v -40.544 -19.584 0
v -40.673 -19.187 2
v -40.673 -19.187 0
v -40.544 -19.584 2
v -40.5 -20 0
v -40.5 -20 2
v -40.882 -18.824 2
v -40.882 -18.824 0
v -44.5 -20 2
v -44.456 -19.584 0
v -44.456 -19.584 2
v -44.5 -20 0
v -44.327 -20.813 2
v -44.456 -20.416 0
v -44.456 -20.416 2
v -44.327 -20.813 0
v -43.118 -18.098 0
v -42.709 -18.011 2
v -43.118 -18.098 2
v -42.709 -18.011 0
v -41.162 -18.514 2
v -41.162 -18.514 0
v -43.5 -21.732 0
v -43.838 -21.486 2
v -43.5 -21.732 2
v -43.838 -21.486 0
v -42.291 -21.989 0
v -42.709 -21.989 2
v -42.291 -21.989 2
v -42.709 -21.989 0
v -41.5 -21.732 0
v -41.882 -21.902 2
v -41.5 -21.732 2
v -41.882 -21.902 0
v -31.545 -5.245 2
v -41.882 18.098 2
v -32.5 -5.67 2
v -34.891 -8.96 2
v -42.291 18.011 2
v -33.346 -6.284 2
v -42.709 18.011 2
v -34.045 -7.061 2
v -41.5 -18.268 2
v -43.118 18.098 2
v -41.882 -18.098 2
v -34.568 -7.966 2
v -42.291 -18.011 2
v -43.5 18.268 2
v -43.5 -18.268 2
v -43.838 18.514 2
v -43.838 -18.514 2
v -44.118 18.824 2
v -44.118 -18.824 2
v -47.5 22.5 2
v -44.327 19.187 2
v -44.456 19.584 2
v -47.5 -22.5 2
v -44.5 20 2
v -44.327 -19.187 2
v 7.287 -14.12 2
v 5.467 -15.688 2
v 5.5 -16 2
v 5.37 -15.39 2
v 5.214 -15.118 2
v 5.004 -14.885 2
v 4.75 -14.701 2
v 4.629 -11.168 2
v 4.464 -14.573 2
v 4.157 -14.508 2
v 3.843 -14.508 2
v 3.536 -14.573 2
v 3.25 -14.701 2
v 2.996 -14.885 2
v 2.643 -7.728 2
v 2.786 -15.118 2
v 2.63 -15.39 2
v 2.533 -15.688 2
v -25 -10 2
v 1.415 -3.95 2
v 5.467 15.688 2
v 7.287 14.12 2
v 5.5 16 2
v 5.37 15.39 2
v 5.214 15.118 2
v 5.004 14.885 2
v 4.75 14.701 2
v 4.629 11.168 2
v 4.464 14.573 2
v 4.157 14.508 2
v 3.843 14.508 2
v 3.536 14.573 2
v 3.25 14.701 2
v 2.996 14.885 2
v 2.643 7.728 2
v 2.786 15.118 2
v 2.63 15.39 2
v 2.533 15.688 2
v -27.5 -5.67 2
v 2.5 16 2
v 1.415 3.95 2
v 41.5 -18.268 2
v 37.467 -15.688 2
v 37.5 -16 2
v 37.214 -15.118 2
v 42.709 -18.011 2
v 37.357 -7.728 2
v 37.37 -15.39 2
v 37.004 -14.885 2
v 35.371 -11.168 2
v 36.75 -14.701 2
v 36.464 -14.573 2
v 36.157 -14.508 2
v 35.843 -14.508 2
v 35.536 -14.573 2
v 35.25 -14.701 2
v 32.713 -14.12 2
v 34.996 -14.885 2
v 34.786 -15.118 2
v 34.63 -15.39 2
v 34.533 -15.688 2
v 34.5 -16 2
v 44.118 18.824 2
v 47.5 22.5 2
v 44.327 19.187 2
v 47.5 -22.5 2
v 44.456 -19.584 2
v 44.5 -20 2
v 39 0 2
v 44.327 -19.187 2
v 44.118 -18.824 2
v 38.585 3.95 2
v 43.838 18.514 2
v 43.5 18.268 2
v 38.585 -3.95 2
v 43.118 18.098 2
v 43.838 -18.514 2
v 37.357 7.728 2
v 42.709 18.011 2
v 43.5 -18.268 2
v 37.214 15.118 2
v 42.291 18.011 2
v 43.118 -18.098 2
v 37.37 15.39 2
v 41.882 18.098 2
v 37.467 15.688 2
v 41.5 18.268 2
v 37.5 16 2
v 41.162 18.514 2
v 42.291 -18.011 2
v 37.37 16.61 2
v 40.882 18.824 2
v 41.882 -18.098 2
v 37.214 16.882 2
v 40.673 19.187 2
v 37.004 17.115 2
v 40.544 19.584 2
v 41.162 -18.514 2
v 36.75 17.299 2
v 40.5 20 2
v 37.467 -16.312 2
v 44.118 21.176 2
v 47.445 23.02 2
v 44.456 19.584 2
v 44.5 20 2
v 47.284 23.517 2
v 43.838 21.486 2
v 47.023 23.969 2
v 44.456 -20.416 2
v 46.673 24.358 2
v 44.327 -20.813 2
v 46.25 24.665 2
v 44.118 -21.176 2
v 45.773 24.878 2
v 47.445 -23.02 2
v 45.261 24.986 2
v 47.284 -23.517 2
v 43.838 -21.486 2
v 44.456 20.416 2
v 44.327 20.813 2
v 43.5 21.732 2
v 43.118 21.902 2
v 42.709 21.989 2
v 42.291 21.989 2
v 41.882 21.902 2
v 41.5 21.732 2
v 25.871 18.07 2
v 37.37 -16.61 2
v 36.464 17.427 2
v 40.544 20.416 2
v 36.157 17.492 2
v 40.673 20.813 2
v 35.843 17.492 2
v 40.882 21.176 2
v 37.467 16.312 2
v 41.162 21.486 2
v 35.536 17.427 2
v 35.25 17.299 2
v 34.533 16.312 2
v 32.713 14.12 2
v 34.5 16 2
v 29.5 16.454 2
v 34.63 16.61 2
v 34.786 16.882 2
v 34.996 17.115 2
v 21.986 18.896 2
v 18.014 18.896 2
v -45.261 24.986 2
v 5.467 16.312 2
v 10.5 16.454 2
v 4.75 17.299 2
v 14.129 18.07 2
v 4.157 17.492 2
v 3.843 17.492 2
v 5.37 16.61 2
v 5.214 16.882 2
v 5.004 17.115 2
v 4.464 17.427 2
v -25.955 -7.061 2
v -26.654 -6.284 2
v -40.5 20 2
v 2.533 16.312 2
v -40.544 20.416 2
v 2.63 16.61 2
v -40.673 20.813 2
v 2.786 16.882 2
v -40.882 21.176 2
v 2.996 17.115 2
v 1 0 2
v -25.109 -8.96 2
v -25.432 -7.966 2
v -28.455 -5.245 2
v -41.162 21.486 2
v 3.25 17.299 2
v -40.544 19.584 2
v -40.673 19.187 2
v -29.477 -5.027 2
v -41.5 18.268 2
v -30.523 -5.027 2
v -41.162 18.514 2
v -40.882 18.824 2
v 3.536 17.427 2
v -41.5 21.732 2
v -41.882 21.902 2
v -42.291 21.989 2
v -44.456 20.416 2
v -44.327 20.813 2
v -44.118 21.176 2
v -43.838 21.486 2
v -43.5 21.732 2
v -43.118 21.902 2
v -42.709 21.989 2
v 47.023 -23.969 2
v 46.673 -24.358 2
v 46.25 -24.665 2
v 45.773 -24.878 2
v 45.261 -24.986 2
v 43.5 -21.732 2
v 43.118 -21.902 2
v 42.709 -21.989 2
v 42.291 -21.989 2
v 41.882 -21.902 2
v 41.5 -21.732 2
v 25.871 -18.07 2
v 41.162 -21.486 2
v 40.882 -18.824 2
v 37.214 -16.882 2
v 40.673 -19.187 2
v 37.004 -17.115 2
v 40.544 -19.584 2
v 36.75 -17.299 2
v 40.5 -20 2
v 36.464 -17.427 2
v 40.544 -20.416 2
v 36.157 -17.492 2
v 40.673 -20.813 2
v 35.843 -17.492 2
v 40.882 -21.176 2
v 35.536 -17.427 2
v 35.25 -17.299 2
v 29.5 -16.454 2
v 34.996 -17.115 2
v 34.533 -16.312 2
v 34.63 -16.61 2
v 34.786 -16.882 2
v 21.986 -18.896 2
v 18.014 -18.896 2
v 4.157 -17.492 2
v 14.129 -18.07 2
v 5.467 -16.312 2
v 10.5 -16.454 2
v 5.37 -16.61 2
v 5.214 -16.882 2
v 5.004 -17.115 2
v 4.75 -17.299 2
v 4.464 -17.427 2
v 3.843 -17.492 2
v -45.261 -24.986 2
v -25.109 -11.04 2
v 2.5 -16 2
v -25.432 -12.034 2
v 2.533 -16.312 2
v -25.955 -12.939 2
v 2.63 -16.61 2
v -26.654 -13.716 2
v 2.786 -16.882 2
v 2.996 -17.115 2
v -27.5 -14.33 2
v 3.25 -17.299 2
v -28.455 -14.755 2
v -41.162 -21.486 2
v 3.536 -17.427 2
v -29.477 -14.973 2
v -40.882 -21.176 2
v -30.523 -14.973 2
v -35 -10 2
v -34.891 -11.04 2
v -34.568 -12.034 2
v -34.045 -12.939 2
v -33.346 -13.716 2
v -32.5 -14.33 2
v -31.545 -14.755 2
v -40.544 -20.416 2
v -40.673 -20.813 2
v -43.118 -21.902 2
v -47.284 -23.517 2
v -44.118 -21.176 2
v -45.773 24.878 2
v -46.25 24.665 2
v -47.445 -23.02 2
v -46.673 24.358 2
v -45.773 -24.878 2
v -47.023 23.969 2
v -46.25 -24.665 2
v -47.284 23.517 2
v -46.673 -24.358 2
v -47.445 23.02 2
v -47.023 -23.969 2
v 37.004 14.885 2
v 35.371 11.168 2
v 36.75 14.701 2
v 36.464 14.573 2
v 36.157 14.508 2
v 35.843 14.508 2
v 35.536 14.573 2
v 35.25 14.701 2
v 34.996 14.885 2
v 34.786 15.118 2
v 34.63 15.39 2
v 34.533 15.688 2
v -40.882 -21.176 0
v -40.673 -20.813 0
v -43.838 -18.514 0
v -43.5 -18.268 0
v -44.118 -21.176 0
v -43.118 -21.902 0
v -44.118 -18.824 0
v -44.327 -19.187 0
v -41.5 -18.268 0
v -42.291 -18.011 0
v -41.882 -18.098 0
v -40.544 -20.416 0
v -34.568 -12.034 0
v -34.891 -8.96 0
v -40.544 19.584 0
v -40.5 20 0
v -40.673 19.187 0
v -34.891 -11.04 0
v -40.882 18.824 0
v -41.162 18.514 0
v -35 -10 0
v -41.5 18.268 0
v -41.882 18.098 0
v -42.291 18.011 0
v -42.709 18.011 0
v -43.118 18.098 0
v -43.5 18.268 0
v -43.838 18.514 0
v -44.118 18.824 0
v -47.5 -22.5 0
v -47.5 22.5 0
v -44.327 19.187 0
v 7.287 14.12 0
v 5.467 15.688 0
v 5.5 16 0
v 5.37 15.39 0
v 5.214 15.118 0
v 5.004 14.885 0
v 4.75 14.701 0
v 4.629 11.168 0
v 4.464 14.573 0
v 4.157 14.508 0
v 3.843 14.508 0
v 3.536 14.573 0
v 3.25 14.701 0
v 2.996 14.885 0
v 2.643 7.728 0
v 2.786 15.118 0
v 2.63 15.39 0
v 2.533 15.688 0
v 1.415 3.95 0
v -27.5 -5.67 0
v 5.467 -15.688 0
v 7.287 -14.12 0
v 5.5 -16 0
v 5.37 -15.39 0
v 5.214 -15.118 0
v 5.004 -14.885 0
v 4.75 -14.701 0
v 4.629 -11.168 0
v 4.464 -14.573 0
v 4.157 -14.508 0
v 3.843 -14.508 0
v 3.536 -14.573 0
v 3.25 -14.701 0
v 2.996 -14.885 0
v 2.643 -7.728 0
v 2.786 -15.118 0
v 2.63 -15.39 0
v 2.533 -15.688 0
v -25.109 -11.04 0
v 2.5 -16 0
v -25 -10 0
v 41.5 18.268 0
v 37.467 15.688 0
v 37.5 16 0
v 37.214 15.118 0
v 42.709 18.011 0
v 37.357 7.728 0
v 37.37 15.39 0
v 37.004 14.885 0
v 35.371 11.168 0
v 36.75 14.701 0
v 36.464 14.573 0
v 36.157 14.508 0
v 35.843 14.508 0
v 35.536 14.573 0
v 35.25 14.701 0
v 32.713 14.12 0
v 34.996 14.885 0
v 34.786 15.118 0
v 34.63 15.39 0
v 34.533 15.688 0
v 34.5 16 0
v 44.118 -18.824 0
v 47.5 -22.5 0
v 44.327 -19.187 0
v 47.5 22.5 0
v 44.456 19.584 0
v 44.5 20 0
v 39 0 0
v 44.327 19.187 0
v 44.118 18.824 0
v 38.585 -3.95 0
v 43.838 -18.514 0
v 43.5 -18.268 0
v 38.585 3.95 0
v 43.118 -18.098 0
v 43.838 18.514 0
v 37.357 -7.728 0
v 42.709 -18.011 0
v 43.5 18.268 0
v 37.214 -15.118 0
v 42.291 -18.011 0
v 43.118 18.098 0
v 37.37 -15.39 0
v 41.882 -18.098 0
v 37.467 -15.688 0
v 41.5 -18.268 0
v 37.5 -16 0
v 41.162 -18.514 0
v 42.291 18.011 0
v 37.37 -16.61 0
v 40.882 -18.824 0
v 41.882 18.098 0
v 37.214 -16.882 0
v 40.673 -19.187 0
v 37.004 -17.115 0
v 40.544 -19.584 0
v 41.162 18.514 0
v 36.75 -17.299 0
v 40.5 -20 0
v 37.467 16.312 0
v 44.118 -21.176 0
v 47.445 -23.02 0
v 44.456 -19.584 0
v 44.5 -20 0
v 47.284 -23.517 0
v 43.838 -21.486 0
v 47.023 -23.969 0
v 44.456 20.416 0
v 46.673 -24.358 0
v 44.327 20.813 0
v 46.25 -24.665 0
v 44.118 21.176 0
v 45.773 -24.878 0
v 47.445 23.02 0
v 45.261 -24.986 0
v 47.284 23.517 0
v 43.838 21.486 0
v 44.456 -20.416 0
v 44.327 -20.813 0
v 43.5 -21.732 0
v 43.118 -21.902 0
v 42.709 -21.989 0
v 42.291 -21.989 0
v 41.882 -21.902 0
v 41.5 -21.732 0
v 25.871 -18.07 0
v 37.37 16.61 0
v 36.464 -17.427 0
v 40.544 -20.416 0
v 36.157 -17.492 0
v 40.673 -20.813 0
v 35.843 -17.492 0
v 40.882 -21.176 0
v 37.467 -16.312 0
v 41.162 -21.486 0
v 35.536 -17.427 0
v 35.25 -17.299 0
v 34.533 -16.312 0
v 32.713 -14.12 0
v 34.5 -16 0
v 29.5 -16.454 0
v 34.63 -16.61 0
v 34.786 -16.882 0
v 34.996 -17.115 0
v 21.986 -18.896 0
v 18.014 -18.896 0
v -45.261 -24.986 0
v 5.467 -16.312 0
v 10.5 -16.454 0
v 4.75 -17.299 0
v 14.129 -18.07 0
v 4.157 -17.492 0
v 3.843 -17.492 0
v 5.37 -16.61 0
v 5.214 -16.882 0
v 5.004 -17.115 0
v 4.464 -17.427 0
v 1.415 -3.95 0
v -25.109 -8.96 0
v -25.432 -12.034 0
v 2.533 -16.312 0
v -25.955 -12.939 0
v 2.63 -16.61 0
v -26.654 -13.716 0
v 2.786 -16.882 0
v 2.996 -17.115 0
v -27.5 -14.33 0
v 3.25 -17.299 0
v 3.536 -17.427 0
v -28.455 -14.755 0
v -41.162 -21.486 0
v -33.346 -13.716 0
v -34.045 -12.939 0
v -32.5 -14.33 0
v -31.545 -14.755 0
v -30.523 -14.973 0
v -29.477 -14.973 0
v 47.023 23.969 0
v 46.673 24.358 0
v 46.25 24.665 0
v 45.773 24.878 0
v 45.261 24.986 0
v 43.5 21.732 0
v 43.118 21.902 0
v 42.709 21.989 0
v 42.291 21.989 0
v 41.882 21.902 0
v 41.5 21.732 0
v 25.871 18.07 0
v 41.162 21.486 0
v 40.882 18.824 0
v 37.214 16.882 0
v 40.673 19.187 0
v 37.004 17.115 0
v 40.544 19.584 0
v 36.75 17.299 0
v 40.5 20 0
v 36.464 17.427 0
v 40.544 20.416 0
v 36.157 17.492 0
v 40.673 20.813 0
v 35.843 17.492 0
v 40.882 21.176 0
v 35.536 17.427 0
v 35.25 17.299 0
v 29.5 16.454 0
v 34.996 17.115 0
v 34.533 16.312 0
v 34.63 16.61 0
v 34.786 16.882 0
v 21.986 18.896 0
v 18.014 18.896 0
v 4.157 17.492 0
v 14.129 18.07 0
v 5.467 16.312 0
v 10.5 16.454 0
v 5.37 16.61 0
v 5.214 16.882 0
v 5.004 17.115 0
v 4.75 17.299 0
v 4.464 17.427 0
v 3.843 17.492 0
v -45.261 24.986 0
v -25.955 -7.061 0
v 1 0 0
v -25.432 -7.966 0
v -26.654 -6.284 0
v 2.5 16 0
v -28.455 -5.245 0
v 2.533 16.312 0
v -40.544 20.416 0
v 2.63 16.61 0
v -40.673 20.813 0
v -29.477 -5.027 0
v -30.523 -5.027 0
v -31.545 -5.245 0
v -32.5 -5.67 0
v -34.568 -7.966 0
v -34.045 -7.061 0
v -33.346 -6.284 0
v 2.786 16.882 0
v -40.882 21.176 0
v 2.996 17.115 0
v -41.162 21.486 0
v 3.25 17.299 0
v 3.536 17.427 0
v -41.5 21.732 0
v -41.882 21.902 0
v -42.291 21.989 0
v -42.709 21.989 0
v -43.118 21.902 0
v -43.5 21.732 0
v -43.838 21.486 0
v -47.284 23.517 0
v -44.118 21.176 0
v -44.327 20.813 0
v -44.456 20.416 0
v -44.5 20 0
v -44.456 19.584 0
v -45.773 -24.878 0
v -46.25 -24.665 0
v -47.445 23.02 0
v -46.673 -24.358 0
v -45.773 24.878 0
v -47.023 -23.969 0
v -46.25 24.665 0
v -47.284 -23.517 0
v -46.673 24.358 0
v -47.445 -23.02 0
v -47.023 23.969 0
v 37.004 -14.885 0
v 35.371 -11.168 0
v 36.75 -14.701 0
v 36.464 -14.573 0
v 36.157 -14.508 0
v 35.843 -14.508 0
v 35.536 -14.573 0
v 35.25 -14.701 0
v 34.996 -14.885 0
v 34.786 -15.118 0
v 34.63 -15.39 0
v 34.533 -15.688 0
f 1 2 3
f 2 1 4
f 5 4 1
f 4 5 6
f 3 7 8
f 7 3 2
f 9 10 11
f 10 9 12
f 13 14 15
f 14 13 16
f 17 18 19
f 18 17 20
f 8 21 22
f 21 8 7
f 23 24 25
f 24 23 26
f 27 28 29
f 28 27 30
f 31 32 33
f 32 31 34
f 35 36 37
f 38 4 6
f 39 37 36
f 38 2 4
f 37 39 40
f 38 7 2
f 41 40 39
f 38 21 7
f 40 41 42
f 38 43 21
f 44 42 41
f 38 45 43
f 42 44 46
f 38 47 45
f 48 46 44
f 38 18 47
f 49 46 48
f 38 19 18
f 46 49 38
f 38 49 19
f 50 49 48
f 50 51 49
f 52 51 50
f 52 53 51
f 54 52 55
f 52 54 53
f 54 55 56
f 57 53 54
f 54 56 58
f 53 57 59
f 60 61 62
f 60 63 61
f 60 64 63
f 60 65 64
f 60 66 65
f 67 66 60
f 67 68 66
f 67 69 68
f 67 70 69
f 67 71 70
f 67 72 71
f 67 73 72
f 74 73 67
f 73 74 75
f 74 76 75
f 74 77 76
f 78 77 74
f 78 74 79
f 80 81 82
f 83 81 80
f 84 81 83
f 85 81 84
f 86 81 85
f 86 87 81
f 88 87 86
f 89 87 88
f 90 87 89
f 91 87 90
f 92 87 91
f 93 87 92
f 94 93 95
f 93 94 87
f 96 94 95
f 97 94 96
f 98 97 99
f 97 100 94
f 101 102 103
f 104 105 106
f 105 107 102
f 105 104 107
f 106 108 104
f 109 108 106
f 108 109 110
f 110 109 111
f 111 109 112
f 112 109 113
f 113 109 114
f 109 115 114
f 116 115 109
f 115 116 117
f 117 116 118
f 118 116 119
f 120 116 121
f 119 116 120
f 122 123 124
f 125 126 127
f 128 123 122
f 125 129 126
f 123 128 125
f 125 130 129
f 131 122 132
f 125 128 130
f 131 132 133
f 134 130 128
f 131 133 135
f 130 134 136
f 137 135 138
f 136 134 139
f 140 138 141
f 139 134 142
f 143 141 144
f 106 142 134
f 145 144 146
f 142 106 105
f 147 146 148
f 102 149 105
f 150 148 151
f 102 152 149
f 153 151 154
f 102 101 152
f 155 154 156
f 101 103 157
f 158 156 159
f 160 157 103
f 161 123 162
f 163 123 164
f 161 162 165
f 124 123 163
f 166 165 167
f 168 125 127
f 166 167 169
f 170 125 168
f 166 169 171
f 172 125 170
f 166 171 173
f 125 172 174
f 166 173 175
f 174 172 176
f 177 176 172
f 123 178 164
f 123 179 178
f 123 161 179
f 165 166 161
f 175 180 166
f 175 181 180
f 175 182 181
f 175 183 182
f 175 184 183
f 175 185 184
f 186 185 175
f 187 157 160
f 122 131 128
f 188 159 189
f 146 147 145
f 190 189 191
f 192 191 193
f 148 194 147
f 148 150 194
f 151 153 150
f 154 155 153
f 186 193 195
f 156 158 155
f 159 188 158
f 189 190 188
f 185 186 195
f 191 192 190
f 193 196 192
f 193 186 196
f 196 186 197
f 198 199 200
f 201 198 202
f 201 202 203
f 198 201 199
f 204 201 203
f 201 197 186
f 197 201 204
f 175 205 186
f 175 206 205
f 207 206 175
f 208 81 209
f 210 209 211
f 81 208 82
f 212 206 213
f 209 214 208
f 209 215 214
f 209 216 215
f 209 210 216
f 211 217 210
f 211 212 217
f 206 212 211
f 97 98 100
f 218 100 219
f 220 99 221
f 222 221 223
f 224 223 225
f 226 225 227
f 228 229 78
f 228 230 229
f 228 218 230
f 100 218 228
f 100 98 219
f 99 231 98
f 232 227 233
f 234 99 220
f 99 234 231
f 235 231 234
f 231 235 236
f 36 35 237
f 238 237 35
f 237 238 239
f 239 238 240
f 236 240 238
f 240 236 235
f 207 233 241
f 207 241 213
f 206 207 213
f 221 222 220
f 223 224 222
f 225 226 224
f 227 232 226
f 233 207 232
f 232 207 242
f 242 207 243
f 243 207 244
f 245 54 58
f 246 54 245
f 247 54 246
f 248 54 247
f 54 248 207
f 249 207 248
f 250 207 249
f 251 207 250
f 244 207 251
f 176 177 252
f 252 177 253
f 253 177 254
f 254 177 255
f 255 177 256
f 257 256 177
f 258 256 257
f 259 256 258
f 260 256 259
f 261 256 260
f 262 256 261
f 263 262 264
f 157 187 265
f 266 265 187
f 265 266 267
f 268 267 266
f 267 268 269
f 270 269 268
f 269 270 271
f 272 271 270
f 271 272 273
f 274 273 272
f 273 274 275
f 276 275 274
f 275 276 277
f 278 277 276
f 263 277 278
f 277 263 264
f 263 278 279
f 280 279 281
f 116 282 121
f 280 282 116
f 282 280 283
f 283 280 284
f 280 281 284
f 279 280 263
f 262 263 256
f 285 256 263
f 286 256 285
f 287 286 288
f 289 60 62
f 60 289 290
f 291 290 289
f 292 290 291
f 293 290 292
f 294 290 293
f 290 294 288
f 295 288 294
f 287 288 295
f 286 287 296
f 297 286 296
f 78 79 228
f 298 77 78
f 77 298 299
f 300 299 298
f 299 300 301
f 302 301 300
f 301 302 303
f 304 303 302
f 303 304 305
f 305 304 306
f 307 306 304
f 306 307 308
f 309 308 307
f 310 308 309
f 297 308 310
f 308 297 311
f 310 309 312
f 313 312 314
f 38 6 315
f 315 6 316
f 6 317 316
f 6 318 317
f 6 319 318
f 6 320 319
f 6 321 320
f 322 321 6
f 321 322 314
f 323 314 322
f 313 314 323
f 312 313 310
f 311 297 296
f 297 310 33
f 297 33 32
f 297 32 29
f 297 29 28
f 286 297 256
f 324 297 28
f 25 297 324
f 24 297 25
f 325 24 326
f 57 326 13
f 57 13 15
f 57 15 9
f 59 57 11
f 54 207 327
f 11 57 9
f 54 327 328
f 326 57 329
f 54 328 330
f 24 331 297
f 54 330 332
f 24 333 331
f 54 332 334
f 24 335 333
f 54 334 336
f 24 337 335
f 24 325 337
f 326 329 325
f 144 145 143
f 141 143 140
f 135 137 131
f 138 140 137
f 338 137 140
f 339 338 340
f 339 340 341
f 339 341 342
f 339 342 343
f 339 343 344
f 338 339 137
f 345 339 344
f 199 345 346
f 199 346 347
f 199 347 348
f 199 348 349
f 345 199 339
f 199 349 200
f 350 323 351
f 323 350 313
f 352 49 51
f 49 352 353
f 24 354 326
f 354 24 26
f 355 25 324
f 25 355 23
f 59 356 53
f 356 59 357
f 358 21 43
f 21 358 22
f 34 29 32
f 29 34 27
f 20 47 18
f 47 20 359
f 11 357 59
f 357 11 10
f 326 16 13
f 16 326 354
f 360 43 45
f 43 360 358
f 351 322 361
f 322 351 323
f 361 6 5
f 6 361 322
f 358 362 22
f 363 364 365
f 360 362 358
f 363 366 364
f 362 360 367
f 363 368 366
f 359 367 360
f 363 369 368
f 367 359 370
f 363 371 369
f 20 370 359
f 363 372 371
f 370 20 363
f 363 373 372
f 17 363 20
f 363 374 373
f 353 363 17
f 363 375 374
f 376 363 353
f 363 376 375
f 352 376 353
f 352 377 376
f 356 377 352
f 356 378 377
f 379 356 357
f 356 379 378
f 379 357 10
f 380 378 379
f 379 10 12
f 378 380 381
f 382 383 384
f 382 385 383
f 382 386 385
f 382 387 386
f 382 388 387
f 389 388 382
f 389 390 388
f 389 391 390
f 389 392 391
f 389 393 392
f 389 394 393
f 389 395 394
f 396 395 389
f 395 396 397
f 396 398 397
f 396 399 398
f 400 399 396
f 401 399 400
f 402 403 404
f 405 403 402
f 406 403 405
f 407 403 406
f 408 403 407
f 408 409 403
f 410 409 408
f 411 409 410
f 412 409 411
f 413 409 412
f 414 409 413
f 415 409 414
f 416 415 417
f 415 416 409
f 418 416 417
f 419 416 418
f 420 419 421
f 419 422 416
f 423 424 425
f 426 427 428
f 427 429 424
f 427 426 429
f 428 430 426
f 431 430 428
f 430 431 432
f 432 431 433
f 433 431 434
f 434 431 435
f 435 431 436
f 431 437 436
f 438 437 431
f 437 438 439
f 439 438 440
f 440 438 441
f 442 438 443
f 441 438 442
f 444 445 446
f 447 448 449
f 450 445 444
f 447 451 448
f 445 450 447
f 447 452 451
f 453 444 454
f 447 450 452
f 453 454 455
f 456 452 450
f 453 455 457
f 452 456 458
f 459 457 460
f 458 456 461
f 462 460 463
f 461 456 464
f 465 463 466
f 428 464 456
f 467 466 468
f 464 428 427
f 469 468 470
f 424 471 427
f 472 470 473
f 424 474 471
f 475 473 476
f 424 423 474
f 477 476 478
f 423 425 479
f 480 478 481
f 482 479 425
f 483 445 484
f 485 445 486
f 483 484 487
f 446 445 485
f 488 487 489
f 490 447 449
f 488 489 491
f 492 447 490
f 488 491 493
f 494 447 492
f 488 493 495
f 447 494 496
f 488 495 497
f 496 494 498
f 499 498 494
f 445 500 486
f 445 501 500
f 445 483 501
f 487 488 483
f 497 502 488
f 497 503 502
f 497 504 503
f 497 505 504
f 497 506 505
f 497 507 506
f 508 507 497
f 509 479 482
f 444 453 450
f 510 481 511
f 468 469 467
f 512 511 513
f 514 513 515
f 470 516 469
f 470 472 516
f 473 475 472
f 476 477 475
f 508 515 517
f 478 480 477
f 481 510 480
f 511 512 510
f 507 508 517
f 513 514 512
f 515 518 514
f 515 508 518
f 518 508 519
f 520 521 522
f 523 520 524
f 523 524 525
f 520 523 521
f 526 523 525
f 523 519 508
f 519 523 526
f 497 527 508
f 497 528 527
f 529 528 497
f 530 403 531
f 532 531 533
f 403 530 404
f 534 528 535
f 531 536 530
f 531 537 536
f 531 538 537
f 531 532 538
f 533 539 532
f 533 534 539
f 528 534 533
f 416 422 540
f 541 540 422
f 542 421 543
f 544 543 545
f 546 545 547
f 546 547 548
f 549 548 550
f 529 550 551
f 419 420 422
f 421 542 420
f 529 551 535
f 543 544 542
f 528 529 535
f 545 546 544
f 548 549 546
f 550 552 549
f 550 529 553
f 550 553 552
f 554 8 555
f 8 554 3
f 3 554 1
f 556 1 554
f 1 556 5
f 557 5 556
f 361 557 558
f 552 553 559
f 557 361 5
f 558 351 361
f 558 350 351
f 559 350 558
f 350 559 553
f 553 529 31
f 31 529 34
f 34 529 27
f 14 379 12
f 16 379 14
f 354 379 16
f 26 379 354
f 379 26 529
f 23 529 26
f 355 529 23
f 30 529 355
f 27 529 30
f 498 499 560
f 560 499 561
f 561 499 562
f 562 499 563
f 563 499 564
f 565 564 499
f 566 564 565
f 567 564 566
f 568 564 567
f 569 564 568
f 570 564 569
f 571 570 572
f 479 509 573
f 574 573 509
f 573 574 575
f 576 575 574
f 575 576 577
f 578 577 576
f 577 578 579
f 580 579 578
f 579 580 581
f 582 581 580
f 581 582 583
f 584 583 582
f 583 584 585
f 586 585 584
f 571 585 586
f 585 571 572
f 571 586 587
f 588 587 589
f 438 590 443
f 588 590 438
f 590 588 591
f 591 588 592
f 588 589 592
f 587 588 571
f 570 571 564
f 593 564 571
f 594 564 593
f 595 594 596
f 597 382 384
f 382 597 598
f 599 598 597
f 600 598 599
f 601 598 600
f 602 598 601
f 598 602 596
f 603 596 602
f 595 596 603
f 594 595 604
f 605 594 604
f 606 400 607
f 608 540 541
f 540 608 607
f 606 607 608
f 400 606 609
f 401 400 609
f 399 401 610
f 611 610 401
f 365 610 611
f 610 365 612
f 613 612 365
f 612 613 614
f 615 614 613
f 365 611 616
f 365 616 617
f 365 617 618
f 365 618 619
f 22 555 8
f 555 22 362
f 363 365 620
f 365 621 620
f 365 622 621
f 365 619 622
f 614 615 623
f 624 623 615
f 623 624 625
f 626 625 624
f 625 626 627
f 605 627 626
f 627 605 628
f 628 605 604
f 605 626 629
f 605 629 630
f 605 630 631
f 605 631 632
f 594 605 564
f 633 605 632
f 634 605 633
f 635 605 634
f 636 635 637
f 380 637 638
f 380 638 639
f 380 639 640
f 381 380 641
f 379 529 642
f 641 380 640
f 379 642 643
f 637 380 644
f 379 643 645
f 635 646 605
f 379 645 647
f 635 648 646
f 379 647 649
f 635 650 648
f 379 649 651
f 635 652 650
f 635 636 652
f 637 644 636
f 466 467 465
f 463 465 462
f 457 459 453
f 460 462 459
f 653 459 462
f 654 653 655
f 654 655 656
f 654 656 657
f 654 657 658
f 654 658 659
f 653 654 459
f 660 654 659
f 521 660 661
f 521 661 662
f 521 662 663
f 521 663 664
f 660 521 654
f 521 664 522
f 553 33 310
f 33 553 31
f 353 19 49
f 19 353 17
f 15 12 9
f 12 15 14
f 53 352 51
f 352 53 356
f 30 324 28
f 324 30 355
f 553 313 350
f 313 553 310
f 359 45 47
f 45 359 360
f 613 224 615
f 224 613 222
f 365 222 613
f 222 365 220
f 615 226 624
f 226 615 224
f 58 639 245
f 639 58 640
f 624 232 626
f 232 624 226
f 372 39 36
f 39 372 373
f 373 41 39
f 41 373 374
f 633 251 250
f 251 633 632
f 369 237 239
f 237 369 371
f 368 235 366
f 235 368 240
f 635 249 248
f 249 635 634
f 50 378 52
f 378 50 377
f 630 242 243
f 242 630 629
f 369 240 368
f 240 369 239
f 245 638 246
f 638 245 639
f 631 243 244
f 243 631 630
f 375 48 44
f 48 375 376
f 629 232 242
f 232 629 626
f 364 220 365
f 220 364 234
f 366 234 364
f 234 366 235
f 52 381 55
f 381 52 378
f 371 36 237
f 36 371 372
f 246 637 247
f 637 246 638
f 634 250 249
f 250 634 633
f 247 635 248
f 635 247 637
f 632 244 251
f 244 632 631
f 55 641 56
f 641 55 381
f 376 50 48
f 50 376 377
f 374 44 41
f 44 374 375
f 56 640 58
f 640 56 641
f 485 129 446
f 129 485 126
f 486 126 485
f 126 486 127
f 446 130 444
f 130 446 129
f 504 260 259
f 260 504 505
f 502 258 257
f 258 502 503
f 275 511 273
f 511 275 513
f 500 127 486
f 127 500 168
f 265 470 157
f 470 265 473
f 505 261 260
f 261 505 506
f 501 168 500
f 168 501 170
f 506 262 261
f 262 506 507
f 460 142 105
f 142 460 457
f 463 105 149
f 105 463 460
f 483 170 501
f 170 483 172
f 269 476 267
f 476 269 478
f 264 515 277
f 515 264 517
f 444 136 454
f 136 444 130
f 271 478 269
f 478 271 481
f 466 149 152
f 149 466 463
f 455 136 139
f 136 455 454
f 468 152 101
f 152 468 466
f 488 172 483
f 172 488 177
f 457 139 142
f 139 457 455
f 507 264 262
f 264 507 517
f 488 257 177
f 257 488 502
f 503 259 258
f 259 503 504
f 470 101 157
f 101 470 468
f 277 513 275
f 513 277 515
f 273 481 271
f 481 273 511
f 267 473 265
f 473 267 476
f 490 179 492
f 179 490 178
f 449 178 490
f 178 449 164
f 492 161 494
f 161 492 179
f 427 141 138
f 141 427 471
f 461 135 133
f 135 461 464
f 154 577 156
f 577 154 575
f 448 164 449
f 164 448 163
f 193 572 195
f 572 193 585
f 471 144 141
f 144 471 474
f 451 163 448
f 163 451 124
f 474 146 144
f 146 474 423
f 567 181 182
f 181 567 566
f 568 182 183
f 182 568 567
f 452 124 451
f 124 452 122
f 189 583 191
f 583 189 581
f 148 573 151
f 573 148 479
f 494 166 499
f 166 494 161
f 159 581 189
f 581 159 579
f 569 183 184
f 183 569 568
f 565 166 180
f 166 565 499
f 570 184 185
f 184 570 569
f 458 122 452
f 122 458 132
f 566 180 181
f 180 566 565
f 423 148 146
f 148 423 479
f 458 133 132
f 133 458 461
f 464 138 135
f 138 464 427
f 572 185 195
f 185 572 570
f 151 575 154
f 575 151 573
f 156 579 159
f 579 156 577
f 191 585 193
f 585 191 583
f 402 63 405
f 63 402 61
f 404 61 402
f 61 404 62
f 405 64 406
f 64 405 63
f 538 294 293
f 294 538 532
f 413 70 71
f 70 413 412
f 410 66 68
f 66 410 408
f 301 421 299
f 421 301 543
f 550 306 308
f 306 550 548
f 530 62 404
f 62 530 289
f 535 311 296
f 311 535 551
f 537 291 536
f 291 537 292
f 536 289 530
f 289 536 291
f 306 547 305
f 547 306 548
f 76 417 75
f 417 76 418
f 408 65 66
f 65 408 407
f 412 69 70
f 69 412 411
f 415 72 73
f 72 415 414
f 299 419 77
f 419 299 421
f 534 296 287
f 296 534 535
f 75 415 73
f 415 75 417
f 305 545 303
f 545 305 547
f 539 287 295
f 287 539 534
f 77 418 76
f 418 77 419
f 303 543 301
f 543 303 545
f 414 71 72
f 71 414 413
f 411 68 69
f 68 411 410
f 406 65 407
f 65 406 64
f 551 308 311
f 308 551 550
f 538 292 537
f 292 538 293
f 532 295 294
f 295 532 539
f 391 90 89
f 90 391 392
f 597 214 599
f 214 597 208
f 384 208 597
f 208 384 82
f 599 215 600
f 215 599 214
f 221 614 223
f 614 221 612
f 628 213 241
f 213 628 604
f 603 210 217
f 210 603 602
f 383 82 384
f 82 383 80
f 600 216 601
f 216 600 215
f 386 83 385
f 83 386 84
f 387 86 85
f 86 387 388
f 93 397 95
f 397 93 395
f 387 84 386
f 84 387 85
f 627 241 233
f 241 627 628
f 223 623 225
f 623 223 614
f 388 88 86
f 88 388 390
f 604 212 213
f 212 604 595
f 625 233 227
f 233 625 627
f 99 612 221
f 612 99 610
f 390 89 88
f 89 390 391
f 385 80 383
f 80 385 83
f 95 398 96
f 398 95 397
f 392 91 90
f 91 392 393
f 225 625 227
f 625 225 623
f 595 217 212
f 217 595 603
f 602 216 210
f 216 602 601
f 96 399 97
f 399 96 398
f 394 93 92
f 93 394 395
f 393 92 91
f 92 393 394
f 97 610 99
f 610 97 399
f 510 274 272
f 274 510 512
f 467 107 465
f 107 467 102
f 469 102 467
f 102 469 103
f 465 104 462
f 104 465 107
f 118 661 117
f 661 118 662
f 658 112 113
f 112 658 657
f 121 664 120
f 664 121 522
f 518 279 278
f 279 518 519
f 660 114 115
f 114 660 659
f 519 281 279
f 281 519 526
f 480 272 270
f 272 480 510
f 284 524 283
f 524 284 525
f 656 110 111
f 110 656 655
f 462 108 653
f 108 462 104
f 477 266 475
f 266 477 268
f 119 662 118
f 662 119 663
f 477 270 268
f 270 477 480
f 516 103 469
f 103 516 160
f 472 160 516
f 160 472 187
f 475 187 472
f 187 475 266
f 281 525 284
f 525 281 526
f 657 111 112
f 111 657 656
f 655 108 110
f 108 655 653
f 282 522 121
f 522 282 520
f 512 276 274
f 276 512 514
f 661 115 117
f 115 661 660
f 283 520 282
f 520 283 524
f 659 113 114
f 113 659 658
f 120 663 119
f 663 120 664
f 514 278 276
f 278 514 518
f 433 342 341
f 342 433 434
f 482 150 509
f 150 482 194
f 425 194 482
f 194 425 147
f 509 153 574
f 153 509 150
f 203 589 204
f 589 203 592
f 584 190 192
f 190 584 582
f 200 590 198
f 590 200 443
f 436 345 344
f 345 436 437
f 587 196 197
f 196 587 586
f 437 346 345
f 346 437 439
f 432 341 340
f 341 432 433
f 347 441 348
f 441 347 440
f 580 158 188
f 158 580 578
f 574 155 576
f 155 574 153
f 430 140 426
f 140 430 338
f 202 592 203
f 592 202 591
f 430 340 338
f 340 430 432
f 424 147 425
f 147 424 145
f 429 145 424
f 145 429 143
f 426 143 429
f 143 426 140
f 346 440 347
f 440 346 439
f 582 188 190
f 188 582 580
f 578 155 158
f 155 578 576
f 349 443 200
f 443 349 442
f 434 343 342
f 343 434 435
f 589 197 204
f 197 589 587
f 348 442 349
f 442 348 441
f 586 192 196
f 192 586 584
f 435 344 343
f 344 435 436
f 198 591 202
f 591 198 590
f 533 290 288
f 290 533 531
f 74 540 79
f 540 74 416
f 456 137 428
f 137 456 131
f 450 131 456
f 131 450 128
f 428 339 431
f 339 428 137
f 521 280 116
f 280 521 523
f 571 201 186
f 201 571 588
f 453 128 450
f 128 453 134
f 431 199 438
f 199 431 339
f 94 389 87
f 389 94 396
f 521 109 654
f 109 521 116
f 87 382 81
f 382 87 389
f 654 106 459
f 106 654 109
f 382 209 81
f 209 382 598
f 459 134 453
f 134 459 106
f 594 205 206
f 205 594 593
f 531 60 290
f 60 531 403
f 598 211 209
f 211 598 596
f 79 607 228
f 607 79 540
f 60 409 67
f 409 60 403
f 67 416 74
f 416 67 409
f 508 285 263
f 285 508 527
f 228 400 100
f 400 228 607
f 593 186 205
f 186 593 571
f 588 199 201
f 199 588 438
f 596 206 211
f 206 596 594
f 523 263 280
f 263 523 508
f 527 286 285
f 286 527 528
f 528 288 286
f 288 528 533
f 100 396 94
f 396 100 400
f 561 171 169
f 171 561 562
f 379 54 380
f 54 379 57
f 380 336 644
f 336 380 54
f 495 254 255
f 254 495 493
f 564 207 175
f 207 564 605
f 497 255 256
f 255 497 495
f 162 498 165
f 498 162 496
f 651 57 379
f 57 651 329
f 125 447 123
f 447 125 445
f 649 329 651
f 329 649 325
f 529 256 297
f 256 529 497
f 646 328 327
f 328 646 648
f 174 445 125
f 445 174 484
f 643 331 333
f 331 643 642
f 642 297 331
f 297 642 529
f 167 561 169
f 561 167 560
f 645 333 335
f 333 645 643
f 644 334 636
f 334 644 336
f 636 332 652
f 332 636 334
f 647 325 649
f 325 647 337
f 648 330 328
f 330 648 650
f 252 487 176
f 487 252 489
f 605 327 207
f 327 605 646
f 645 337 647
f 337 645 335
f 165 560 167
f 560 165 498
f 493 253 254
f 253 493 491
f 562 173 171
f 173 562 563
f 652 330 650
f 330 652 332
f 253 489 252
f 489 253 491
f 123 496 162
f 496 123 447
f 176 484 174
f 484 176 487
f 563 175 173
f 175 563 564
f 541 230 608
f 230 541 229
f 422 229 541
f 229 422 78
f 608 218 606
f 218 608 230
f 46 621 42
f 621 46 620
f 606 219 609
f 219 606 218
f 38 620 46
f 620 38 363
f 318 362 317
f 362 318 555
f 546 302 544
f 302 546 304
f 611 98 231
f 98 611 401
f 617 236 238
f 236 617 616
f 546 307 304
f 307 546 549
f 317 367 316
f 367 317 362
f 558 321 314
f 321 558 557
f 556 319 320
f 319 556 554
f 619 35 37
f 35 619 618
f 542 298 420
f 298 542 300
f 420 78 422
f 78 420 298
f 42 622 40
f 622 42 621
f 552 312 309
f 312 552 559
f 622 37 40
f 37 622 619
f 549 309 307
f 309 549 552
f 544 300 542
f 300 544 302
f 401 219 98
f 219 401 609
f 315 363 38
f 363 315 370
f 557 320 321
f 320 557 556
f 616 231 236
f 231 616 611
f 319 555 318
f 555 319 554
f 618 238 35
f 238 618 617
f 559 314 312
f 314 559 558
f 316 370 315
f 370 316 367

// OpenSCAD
WIDTH = 95;
HEIGHT = 50;
THICKNESS = 2;
CORNER_DIA = 5;

MOUNT_DIA = 4;
MOUNT_HEIGHT = 40;
MOUNT_WIDTH = 85;

BUTTON_DIA = 10;
BUTTON_OFFSET_X = -30;
BUTTON_OFFSET_Y = -10;

BUTTON = true;

FAN_MOUNT_DIA = 3;
FAN_MOUNT_SPACING = 32;
FAN_DIA = 38;
FAN_OFFSET_X = 20;
FAN_OFFSET_Y = 0;

FAN = true;

$fn = 30;

module rounded_cube(width, height, thickness, corner_dia) {
    hull() {
        for(i = [-1, 1]) {
            for(j = [-1, 1]) {
                translate([i * (width - corner_dia)/2, j * (height - corner_dia)/2, 0])
                cylinder(d = corner_dia, h = thickness);
            }
        }
    }
}

module plate() {
    rounded_cube(WIDTH, HEIGHT, THICKNESS, CORNER_DIA);
}

module mount_neg() {
    union() {
        for(i = [-1, 1]) {
            for(j = [-1, 1]) {
                translate([i * MOUNT_WIDTH/2, j * MOUNT_HEIGHT/2, 0])
                cylinder(d = MOUNT_DIA, h = THICKNESS);
            }
        }
    }
}

module button_hole_neg() {
    cylinder(d = BUTTON_DIA, h = THICKNESS);
}

module fan_mount_neg() {
    union() {
        for(i = [-1, 1]) {
            for(j = [-1, 1]) {
                translate([i * FAN_MOUNT_SPACING/2, j * FAN_MOUNT_SPACING/2, 0])
                cylinder(d = FAN_MOUNT_DIA, h = THICKNESS);
            }
        }
        cylinder(d = FAN_DIA, h = THICKNESS);
    }
}

difference() {
    plate();
    mount_neg();
    if(BUTTON) {
        translate([BUTTON_OFFSET_X, BUTTON_OFFSET_Y, 0])
        button_hole_neg();
    }
    if(FAN) {
        translate([FAN_OFFSET_X, FAN_OFFSET_Y, 0])
        fan_mount_neg();
    }
}
